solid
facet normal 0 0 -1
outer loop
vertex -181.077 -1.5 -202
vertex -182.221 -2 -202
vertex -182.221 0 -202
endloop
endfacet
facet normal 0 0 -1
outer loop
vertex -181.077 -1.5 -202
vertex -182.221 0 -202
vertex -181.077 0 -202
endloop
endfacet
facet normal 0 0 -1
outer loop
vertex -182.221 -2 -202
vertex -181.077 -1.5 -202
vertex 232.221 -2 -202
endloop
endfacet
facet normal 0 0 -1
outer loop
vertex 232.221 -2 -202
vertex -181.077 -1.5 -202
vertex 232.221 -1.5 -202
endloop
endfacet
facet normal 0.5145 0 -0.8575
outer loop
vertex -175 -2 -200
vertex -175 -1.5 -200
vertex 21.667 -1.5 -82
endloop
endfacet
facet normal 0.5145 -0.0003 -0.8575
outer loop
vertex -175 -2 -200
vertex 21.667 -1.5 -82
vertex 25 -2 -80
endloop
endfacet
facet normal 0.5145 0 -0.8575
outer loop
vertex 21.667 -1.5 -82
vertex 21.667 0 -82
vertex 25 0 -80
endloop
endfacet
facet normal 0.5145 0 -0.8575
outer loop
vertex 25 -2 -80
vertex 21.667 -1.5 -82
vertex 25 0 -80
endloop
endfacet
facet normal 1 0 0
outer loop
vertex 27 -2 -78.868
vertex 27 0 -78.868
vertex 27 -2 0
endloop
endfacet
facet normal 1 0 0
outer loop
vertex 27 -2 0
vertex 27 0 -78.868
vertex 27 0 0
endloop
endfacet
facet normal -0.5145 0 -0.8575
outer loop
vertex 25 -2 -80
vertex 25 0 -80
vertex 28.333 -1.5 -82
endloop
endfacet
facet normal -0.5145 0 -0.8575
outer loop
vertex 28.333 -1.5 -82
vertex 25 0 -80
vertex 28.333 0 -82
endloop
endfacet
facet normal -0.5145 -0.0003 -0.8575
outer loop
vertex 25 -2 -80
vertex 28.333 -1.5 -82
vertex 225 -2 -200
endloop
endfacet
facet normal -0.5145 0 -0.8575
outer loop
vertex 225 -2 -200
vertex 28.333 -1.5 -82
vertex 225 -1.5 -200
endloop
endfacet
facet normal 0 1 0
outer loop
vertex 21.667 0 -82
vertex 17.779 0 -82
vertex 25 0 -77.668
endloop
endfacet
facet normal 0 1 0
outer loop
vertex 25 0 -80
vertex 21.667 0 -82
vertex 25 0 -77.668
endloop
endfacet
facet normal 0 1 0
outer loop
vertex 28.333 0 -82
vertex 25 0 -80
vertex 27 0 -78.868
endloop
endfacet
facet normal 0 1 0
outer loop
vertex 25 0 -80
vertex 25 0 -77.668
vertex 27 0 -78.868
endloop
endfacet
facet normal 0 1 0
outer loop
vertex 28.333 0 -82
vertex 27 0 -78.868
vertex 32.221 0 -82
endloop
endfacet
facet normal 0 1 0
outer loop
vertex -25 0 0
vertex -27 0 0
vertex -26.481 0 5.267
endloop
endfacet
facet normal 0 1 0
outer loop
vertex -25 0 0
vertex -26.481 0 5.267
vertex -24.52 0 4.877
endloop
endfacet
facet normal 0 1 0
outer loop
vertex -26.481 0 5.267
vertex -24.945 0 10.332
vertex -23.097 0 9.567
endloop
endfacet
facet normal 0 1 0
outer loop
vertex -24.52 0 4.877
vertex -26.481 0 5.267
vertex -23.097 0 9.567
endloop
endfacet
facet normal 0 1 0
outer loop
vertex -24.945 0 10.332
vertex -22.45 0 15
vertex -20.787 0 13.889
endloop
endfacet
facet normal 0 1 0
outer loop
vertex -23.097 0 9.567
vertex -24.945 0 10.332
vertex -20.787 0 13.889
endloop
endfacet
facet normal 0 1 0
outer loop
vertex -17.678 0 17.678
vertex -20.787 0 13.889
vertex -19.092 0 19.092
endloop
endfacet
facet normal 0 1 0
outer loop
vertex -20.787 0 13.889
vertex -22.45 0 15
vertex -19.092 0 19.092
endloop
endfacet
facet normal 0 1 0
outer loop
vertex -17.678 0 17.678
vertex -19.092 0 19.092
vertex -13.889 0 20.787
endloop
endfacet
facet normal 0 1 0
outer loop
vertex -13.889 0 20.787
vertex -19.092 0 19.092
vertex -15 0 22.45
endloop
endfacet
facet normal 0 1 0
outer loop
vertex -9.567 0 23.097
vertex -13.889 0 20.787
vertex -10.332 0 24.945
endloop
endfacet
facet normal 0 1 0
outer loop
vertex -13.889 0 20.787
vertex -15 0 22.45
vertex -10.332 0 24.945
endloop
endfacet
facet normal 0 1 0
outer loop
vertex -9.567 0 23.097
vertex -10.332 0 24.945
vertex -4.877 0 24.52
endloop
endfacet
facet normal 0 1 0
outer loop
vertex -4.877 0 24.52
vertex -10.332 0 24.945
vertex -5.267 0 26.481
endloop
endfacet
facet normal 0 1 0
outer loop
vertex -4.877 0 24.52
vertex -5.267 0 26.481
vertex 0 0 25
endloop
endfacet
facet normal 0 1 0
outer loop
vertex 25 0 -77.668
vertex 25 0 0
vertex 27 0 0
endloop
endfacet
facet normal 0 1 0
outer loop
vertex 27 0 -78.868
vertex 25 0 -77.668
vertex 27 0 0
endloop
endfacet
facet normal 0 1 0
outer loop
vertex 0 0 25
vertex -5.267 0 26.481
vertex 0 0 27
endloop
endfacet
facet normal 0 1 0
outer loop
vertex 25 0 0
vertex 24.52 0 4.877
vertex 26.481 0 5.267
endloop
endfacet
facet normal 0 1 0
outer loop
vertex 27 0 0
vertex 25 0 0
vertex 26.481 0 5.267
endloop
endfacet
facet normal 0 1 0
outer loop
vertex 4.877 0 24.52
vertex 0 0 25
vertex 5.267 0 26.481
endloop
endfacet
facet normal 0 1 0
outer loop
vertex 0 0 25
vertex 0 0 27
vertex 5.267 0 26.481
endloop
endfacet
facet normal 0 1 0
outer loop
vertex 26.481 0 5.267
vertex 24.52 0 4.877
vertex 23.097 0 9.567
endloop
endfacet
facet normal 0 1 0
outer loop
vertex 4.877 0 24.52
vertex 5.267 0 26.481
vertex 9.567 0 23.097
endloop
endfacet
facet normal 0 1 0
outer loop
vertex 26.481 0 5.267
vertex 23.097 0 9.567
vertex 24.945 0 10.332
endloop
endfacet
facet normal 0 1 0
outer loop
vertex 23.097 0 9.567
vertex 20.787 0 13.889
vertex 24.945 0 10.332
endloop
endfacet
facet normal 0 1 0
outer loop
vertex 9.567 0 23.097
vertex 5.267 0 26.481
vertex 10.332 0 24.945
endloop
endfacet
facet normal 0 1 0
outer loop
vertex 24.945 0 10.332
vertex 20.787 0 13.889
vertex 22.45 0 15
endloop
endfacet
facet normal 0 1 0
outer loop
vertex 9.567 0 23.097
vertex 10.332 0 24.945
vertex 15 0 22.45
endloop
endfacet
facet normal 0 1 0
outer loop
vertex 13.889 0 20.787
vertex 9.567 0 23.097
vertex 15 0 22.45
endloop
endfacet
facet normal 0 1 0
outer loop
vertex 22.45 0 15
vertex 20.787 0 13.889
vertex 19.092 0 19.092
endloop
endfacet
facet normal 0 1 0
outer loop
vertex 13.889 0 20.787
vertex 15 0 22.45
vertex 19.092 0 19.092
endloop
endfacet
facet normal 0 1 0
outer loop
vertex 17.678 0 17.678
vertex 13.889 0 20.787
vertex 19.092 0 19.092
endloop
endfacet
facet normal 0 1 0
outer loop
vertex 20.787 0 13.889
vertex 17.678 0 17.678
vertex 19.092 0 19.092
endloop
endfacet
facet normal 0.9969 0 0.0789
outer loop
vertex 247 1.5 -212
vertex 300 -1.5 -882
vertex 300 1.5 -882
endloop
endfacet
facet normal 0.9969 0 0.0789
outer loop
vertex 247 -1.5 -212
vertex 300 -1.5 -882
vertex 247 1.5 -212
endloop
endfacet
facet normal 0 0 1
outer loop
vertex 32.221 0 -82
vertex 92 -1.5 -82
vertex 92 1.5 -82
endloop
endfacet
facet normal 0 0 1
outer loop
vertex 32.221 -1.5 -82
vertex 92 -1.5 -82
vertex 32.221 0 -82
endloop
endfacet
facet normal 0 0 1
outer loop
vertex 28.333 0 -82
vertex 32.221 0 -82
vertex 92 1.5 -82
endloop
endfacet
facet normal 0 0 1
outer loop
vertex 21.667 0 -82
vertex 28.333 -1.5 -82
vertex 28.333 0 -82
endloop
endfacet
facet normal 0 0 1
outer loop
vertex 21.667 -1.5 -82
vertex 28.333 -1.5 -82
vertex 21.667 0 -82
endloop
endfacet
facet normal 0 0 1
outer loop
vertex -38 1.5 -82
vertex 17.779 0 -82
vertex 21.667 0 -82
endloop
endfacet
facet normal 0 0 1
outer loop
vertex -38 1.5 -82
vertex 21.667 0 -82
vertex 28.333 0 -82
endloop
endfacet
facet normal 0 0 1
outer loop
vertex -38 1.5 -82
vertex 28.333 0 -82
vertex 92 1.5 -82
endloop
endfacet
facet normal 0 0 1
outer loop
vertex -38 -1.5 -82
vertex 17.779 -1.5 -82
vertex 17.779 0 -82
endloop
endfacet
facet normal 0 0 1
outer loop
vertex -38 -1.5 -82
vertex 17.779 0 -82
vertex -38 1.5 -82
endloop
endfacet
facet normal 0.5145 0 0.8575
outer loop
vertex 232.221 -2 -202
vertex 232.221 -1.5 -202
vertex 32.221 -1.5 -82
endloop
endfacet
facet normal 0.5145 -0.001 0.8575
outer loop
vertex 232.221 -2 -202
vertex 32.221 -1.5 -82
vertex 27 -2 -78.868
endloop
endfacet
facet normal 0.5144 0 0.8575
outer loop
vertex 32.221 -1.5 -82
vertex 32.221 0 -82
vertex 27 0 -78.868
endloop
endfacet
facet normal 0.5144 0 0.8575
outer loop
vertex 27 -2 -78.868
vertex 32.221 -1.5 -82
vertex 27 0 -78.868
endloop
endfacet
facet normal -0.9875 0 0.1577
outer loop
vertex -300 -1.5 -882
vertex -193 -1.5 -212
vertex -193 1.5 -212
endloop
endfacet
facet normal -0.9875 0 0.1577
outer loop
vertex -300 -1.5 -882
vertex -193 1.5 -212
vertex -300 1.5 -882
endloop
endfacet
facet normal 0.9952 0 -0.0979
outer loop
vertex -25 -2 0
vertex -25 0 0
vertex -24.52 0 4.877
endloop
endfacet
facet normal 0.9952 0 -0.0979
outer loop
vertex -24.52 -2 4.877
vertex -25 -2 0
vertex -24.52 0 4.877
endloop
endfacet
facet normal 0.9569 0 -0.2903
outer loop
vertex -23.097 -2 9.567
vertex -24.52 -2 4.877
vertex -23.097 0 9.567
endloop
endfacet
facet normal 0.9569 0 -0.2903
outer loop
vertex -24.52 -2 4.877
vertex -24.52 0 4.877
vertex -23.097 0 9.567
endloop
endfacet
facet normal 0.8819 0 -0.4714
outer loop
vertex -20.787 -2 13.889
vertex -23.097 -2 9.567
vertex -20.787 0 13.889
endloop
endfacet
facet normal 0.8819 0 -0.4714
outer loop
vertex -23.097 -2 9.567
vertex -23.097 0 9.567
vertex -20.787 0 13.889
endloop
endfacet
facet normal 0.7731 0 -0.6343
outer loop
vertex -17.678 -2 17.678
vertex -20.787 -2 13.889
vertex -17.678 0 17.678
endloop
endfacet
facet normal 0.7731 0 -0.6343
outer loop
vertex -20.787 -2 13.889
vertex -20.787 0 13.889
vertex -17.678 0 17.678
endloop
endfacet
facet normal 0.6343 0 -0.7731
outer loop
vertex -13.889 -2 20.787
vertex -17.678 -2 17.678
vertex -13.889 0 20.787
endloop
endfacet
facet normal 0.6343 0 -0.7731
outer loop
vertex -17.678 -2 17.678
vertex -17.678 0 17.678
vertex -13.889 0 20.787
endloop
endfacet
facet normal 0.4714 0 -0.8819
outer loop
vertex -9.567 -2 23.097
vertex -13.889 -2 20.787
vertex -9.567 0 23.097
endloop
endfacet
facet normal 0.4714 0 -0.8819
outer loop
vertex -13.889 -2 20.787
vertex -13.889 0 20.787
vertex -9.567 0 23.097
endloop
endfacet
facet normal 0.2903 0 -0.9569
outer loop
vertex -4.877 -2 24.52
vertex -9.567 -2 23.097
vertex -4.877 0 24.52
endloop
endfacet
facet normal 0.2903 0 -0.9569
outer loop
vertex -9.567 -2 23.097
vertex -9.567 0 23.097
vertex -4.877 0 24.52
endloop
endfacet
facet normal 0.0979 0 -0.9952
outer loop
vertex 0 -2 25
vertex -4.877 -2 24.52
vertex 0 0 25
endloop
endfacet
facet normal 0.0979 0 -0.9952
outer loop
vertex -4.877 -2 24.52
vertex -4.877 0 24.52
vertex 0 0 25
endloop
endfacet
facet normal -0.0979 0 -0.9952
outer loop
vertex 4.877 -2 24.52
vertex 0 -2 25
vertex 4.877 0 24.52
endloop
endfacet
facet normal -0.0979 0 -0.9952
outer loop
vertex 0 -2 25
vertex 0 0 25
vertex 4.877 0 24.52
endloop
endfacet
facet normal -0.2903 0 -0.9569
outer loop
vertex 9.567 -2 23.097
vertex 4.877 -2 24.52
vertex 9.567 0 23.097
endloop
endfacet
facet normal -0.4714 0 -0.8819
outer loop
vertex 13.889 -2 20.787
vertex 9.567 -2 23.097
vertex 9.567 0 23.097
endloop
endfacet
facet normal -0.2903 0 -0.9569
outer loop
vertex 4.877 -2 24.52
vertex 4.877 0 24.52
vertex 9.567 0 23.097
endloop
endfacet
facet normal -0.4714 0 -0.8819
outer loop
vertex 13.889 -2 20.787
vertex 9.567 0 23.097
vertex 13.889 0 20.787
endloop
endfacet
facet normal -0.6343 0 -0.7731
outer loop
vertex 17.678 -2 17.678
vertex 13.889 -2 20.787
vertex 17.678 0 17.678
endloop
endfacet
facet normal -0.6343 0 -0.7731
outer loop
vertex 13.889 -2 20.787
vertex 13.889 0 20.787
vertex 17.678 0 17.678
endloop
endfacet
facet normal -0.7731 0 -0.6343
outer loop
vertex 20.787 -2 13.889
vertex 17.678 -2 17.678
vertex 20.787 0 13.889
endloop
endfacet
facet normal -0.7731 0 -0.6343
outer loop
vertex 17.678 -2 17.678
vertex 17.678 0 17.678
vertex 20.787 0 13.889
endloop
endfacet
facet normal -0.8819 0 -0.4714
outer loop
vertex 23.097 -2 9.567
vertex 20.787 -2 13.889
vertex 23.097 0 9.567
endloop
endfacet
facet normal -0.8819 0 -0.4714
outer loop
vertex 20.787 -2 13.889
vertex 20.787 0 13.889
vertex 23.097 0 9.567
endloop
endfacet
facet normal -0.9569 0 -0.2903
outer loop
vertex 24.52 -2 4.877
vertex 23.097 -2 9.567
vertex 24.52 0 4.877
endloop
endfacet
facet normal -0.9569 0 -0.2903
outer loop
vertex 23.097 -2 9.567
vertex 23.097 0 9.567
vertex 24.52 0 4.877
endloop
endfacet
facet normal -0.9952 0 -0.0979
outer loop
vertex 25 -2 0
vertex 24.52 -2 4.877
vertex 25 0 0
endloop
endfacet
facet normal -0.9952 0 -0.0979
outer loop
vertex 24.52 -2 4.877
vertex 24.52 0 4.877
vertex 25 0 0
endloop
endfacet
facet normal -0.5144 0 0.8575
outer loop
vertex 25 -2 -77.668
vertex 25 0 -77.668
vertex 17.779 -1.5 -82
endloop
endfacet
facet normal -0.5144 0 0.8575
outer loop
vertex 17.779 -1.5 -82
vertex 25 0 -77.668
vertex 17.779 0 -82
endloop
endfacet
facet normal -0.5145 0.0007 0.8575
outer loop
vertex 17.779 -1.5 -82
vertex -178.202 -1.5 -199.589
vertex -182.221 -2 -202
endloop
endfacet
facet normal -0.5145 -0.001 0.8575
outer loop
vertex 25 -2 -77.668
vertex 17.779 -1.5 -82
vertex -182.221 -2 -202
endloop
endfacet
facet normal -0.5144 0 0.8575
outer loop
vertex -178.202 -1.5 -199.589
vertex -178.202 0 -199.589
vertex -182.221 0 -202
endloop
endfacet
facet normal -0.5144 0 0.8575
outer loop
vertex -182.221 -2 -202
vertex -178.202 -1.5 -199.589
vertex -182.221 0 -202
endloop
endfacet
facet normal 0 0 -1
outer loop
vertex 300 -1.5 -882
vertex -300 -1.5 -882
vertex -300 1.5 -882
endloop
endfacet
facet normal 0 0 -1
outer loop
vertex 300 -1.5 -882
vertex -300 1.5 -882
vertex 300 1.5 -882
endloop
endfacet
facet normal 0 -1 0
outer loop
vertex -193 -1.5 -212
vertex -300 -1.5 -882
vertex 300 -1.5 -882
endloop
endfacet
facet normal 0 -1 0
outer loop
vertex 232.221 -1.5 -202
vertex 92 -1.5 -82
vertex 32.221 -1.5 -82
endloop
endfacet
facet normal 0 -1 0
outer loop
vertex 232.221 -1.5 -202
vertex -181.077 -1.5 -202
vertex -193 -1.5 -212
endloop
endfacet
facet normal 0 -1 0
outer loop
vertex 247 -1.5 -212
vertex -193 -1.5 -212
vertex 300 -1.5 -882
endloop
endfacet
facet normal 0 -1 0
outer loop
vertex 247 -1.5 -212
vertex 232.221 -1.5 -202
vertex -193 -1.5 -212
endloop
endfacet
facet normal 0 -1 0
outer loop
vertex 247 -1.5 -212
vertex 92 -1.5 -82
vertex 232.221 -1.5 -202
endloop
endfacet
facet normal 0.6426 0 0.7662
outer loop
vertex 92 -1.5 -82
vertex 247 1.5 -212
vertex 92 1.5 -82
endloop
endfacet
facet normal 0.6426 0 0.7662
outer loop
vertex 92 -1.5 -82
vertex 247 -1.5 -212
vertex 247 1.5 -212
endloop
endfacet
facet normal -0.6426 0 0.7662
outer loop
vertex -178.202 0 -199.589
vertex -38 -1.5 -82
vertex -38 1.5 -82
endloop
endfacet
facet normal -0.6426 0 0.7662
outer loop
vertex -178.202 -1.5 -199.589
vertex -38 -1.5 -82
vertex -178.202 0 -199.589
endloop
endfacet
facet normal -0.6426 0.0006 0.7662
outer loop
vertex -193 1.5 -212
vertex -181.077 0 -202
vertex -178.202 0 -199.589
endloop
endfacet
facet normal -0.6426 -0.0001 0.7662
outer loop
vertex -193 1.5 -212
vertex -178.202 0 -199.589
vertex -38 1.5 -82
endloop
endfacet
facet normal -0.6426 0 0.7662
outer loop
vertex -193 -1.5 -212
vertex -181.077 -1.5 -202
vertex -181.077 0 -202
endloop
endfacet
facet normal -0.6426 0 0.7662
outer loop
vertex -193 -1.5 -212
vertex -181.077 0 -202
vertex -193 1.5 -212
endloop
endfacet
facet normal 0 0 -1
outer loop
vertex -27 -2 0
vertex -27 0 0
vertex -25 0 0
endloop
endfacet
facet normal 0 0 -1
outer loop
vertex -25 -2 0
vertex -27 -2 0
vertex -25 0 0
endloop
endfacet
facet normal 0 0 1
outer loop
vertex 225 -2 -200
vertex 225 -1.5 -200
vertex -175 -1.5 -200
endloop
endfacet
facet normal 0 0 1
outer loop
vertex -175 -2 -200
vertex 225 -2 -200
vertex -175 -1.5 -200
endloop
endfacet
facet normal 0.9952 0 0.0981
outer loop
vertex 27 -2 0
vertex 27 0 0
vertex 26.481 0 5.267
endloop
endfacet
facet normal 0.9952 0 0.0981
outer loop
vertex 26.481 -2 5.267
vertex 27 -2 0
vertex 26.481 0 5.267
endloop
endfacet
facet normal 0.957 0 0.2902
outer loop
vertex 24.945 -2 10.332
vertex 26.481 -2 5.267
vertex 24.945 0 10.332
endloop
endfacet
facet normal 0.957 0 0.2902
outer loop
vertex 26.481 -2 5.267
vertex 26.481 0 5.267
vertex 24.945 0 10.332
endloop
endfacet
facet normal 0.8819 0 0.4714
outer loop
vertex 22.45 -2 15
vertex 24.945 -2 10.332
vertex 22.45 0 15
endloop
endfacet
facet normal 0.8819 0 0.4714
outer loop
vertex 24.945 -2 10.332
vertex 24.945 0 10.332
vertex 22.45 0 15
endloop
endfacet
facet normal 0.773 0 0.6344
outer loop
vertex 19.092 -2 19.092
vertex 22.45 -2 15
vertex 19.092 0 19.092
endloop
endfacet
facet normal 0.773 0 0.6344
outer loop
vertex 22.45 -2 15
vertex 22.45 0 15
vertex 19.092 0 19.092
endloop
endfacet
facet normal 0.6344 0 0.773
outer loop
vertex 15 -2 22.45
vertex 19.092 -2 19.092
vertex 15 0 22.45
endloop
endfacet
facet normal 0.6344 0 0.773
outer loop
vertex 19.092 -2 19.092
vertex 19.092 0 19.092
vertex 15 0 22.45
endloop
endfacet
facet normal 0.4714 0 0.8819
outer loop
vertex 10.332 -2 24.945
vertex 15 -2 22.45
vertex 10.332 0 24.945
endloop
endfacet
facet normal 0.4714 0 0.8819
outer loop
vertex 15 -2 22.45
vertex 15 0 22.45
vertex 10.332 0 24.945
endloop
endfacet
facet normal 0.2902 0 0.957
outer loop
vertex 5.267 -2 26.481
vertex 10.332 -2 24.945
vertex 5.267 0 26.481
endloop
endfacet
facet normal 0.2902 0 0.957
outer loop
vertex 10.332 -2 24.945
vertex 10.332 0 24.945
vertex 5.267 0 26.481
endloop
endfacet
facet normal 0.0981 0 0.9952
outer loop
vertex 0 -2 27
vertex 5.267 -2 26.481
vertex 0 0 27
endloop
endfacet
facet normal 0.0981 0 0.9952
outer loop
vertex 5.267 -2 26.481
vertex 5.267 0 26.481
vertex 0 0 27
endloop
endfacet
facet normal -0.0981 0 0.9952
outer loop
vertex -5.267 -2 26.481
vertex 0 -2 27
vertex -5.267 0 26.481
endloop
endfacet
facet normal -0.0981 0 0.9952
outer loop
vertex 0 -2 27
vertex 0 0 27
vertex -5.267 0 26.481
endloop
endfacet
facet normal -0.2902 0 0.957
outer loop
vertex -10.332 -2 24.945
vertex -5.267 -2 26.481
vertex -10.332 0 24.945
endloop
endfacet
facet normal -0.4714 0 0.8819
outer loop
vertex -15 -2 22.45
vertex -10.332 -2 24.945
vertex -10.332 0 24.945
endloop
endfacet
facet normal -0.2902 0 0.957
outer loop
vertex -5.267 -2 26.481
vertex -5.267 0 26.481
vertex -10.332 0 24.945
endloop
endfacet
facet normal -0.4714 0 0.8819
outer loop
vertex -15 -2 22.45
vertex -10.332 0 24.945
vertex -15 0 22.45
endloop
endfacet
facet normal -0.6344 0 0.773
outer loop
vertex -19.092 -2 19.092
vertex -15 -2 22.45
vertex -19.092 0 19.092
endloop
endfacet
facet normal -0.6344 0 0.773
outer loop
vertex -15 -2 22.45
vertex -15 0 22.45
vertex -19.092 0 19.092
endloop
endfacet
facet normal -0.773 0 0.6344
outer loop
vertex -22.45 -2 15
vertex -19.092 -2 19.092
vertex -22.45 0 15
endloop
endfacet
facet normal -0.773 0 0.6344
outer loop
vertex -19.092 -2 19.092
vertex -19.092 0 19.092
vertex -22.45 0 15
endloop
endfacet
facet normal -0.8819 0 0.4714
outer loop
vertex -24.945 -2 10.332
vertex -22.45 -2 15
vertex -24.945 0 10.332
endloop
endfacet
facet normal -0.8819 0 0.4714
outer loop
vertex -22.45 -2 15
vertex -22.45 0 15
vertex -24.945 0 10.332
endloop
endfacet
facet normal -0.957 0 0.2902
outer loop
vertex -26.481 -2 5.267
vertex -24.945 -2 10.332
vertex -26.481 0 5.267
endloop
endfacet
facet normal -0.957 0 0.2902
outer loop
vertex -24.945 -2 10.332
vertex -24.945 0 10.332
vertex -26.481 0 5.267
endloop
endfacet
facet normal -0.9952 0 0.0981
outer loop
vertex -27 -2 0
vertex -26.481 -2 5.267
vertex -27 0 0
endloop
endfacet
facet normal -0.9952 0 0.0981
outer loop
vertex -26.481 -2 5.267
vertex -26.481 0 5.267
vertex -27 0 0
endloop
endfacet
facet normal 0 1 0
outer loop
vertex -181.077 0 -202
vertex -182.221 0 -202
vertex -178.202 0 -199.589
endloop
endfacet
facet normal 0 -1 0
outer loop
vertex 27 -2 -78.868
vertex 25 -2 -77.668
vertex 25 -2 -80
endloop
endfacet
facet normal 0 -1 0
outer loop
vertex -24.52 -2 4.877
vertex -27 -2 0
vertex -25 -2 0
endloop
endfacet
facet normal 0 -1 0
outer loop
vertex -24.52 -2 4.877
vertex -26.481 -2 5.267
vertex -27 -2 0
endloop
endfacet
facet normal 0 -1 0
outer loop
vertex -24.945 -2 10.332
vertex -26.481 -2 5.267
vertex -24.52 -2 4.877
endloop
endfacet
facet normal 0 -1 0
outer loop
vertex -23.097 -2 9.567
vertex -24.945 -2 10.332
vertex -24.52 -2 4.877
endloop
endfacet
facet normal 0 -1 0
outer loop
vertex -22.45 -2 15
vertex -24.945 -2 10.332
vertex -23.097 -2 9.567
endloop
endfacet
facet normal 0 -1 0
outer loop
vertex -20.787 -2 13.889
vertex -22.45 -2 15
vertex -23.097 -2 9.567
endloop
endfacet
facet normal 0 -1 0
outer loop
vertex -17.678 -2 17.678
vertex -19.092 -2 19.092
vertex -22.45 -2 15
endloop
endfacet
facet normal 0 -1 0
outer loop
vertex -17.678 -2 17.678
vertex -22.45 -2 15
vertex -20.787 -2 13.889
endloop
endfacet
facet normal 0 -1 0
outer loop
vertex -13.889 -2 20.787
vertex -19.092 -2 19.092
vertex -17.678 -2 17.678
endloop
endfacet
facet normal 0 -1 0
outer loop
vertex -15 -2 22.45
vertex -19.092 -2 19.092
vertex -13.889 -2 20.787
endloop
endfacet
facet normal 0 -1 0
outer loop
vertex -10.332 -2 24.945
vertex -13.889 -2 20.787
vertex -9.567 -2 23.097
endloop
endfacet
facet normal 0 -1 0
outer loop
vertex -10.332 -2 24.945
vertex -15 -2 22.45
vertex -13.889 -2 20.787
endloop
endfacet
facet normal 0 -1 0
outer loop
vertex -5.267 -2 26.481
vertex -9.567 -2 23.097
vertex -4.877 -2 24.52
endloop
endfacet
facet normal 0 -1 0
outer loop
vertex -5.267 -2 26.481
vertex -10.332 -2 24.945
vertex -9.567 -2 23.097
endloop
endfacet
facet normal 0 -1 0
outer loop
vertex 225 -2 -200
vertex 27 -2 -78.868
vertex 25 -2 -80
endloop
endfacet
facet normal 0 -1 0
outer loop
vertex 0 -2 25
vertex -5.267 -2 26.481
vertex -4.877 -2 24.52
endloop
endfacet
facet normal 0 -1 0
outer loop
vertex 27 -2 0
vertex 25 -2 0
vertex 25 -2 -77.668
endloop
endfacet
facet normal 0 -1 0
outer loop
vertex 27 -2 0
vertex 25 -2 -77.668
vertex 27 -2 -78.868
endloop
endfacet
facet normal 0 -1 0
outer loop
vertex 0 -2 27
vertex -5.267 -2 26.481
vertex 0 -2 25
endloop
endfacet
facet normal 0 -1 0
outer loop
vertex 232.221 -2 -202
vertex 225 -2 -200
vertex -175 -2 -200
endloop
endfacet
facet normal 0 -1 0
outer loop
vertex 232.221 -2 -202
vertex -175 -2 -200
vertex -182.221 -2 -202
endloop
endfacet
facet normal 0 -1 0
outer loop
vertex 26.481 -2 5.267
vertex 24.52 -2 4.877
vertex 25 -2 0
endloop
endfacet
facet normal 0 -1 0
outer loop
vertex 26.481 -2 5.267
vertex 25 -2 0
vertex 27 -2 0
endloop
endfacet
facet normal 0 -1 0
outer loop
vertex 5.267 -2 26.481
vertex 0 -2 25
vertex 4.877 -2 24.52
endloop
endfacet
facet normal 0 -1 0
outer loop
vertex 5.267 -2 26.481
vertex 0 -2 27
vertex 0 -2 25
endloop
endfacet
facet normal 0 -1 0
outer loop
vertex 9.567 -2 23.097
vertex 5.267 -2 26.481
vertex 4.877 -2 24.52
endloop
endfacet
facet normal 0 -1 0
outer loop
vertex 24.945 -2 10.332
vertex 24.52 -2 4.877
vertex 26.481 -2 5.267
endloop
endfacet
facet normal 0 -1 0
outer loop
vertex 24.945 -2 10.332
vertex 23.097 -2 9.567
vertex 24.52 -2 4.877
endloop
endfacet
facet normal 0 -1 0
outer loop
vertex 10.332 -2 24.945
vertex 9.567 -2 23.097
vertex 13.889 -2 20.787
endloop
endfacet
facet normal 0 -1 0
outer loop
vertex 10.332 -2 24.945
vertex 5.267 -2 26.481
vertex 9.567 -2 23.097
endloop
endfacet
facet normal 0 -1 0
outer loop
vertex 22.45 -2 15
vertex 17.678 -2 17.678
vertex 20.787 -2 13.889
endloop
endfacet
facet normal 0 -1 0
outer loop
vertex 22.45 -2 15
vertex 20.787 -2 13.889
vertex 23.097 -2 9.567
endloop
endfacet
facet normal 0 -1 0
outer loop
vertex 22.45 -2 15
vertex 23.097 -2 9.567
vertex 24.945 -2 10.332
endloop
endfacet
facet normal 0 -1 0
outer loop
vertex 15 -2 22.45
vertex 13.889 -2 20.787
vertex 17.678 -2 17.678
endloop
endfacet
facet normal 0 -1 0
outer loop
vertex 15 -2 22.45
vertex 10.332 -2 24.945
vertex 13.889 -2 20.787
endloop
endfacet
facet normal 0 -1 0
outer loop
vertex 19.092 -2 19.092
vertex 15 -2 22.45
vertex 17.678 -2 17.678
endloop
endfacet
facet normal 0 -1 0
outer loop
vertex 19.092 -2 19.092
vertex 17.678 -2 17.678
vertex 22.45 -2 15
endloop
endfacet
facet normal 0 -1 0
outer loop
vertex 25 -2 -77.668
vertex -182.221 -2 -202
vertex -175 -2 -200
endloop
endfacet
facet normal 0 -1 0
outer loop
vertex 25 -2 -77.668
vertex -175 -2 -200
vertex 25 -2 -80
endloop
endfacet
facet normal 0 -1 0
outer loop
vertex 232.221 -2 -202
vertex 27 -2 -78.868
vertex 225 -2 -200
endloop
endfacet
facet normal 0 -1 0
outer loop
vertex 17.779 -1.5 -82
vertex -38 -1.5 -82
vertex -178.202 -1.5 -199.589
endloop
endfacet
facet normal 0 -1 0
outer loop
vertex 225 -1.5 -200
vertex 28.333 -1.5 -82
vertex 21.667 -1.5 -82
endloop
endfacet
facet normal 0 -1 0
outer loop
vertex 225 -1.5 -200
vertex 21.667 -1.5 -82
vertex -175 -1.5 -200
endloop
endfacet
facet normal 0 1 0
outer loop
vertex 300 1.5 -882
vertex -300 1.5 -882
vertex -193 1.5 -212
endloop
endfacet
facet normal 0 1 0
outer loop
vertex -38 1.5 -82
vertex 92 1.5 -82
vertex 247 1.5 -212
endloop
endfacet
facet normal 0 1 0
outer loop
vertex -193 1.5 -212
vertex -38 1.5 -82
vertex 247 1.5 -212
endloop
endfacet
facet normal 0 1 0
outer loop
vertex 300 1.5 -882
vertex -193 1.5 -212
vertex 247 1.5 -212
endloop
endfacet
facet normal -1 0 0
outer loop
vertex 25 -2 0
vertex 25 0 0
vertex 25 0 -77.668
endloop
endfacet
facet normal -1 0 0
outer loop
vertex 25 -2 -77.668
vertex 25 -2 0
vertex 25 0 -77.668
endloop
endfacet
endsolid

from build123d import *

# Parameters (mm, degrees)
F1_DEPTH = 2
F3_DEPTH = 1.5


with BuildPart() as f1:
    # F0 (on Front) → F1 (new body)
    with BuildSketch(Plane.XZ):
        with BuildLine():
            Line((-27, 0), (-25, 0))
            ThreePointArc((-25, 0), (0, 25), (25, 0))
            Line((25, 0), (25, -77.667619))
            Line((25, -77.667619), (27, -78.867619))
            Line((27, -78.867619), (27, 0))
            ThreePointArc((27, 0), (0, 27), (-27, 0))
        make_face()
        Polygon((27, -78.867619), (25, -77.667619), (-182.220635, -202), (232.220635, -202), align=None)
        Polygon((-175, -200), (25, -80), (225, -200), align=None, mode=Mode.SUBTRACT)
    extrude(amount=F1_DEPTH)

    # F2 (on Front) → F3 (join, symmetric)
    with BuildSketch(Plane.XZ):
        Polygon((92, -82), (-38, -82), (-193, -212), (-300, -882), (300, -882), (247, -212), align=None)
    extrude(amount=F3_DEPTH, both=True)


solid = f1.part
